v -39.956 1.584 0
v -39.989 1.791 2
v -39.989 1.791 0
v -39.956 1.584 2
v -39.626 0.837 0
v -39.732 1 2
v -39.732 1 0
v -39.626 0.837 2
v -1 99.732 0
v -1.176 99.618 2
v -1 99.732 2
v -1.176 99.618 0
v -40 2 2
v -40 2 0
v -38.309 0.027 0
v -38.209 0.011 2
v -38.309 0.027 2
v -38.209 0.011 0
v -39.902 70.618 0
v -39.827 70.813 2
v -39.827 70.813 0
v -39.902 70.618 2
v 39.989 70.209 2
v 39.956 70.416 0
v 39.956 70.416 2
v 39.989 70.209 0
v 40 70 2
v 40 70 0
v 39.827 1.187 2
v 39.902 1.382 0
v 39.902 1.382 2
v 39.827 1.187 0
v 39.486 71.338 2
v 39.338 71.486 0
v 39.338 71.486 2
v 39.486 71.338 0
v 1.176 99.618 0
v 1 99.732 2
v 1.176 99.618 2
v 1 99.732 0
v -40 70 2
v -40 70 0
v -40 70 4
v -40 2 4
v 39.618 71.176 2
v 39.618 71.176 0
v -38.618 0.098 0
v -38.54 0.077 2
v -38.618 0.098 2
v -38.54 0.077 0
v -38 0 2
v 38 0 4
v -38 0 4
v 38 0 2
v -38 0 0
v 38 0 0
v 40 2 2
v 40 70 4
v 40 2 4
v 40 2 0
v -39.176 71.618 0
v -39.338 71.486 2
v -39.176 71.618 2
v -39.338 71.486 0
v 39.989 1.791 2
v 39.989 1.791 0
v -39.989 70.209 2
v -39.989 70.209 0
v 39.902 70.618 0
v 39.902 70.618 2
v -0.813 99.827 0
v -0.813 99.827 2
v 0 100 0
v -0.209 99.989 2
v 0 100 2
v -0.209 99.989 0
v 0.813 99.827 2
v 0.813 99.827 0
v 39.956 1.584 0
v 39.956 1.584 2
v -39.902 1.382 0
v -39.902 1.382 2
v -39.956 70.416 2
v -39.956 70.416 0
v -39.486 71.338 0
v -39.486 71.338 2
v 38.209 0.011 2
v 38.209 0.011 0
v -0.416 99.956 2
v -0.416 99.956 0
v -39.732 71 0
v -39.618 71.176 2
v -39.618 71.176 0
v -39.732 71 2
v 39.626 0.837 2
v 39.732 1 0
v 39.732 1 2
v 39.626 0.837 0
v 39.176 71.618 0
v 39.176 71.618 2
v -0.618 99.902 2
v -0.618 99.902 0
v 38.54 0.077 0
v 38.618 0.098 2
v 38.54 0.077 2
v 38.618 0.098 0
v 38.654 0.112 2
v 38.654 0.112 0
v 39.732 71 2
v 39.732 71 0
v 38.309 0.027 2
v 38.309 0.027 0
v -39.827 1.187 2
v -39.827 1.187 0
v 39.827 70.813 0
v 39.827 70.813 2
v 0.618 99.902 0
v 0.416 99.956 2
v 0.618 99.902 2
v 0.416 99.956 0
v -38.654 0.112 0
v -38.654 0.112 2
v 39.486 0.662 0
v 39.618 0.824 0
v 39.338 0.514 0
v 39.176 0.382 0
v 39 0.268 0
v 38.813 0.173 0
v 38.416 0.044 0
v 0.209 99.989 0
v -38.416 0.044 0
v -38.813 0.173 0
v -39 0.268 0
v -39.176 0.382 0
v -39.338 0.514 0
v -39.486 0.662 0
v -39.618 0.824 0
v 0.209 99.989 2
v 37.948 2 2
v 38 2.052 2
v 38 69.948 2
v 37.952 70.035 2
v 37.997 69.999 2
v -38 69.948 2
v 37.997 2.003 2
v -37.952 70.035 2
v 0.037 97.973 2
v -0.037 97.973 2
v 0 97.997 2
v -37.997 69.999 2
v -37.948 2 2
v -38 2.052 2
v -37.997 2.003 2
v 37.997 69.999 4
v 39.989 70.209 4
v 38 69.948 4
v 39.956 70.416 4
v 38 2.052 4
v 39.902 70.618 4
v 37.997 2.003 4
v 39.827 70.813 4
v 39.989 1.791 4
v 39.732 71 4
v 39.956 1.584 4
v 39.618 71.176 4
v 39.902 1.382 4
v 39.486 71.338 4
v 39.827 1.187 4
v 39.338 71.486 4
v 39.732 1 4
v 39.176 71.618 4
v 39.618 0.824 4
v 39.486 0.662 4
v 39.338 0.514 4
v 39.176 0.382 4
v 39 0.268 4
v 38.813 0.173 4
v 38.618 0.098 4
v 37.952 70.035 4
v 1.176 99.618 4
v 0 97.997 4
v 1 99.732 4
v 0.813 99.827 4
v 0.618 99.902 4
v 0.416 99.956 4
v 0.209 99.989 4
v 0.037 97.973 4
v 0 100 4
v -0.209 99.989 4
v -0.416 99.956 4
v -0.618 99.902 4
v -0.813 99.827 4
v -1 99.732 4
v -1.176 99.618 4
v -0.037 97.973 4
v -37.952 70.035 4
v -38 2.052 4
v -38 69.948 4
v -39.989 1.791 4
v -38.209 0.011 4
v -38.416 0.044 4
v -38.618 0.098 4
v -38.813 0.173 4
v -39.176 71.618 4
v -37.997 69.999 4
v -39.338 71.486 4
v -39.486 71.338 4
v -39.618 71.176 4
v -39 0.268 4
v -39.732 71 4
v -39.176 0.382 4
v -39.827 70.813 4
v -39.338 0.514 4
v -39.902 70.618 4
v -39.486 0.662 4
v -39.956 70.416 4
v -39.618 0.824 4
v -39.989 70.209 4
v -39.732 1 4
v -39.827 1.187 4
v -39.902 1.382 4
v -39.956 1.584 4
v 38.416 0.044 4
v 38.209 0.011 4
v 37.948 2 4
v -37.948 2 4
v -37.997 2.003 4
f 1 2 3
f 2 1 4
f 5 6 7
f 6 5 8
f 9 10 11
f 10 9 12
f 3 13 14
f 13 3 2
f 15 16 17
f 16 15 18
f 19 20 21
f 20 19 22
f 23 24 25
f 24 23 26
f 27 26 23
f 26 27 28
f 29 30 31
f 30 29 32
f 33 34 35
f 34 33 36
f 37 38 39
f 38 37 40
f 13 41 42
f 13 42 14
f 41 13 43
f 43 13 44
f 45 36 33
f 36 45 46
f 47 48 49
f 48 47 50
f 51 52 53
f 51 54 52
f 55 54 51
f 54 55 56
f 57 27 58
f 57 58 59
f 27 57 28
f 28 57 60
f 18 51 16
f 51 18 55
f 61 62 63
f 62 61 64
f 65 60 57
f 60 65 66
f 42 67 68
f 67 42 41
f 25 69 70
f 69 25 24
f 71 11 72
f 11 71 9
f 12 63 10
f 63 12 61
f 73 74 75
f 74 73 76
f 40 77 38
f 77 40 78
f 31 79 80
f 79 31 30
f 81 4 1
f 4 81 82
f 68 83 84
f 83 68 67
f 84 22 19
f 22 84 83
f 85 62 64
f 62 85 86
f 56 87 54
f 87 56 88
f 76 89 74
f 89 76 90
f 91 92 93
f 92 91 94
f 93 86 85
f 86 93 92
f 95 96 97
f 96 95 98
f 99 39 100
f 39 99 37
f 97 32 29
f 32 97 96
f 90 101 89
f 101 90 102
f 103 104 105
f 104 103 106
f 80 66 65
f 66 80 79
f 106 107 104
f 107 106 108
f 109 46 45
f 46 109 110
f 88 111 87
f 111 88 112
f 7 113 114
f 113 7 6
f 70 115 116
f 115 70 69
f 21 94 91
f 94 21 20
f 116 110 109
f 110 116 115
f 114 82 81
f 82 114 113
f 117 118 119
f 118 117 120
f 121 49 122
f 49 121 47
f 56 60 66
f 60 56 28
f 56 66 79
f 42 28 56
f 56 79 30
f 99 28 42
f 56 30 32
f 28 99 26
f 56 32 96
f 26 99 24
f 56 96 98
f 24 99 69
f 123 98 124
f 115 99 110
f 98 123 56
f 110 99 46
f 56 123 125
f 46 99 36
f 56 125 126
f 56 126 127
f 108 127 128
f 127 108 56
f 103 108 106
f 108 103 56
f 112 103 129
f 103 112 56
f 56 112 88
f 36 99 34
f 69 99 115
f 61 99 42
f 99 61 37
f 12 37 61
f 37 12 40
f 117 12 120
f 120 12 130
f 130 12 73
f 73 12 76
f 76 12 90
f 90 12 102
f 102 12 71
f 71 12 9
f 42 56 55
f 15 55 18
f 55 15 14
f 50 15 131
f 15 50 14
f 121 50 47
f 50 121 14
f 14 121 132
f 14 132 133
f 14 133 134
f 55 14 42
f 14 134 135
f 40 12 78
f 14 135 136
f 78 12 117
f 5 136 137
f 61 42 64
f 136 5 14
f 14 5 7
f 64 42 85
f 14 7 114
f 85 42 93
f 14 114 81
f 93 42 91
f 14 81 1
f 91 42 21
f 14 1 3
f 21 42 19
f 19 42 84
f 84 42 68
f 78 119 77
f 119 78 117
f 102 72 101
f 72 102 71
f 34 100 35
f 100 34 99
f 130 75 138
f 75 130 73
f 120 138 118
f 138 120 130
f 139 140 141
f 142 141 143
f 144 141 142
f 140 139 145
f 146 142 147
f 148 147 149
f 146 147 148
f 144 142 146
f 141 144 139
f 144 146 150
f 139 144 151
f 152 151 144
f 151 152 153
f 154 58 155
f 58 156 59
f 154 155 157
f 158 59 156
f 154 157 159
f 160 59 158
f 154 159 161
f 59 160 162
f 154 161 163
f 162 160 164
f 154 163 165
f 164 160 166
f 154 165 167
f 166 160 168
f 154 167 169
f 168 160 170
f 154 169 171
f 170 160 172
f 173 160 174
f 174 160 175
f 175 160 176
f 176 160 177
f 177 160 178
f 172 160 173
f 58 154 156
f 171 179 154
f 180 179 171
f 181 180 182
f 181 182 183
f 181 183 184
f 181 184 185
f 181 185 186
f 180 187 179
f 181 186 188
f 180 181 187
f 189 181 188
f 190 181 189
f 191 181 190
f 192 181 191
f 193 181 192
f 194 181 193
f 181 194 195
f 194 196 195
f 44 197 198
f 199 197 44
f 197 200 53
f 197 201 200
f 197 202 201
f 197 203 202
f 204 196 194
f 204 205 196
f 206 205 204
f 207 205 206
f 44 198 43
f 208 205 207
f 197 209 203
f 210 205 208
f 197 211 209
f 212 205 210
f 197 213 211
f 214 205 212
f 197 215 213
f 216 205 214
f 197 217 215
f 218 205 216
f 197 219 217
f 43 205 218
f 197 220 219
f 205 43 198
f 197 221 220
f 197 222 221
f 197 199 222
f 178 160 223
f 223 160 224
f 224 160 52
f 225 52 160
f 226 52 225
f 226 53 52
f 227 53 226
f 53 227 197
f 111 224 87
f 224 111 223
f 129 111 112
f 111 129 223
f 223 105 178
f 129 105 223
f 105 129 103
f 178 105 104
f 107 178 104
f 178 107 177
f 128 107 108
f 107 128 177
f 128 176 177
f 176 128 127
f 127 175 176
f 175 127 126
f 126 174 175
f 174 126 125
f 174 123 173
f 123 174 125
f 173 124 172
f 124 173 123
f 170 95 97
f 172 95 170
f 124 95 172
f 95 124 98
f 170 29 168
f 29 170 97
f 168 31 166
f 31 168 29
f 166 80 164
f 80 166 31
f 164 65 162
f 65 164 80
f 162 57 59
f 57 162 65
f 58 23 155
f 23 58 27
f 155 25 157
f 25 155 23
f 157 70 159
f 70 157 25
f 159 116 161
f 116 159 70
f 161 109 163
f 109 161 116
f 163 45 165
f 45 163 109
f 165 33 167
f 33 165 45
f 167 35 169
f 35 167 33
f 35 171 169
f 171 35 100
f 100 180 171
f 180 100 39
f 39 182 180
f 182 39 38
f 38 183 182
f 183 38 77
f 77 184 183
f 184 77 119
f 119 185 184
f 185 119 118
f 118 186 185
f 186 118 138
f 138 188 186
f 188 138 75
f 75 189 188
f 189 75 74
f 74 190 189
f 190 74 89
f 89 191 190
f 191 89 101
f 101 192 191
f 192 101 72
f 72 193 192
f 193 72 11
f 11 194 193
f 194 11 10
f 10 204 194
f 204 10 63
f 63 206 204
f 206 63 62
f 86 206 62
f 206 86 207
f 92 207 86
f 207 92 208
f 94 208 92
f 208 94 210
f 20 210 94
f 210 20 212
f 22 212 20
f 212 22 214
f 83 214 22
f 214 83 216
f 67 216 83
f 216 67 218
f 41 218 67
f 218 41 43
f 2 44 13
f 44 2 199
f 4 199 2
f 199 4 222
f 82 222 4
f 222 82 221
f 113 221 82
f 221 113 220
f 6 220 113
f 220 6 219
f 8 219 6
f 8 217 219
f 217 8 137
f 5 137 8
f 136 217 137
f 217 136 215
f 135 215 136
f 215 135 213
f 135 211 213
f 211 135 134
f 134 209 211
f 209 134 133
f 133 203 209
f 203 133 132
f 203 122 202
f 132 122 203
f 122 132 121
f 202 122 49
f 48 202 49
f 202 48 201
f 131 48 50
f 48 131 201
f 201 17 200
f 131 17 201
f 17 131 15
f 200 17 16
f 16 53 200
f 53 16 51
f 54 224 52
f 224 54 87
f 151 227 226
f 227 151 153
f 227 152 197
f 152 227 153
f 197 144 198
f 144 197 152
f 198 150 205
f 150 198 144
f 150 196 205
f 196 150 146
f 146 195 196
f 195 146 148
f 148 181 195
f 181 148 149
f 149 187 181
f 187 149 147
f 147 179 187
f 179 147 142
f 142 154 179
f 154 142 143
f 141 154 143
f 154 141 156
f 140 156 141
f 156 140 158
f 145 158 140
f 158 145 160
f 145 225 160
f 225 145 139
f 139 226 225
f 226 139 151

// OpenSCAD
// file: shape_lib.scad
// shape_lib.scad
// Library of 2D base shapes for the signboard

$fn = 60; // Smooth curves

module shape_house(width, height, corner_r=2) {
    // House shape: Pentagon logic modification
    // "Pentagon with vertical sides and pointed top"
    // We can construct this by intersecting a square and a triangle or using hull()
    
    body_h = height * 0.7;
    roof_h = height - body_h;
    
    hull() {
        // Bottom corners
        translate([-width/2 + corner_r, corner_r]) circle(r=corner_r);
        translate([width/2 - corner_r, corner_r]) circle(r=corner_r);
        
        // Eaves corners (top of vertical section)
        translate([-width/2 + corner_r, body_h]) circle(r=corner_r);
        translate([width/2 - corner_r, body_h]) circle(r=corner_r);
        
        // Roof peak
        translate([0, height - corner_r]) circle(r=corner_r);
    }
}

module shape_square(width, height, corner_r=5) {
    hull() {
        translate([-width/2 + corner_r, corner_r]) circle(r=corner_r);
        translate([width/2 - corner_r, corner_r]) circle(r=corner_r);
        translate([-width/2 + corner_r, height - corner_r]) circle(r=corner_r);
        translate([width/2 - corner_r, height - corner_r]) circle(r=corner_r);
    }
}

module shape_pentagon(radius, corner_r=2) {
    // Regular pentagon
    hull() {
        for (i = [0:4]) {
            rotate([0, 0, i * 360/5 + 90]) // +90 to point up
            translate([radius - corner_r, 0, 0])
            circle(r=corner_r);
        }
    }
}

module shape_circle(radius) {
    circle(r=radius);
}

// Test render
// translate([-50, 0]) shape_house(40, 50);
// translate([0, 0]) shape_square(40, 40);
// translate([50, 0]) shape_pentagon(20);
// main file
// signboard_core.scad
include <shape_lib.scad>;

// --- Parameters ---
// These will be overridden by the command line or JSON values
SHAPE_TYPE = "HOUSE"; // HOUSE, SQUARE, PENTAGON, CIRCLE
WIDTH = 80;
HEIGHT = 100;
THICKNESS_BASE = 2;
THICKNESS_RIM = 4; // Total height including base
RIM_WIDTH = 2;

// --- Logic ---

module base_plate() {
    linear_extrude(THICKNESS_BASE) {
        if (SHAPE_TYPE == "HOUSE") shape_house(WIDTH, HEIGHT);
        else if (SHAPE_TYPE == "SQUARE") shape_square(WIDTH, HEIGHT);
        else if (SHAPE_TYPE == "PENTAGON") shape_pentagon(WIDTH/2); // Width as diameter approx
        else if (SHAPE_TYPE == "CIRCLE") shape_circle(WIDTH/2);
    }
}

module rim() {
    linear_extrude(THICKNESS_RIM) {
        difference() {
            if (SHAPE_TYPE == "HOUSE") shape_house(WIDTH, HEIGHT);
            else if (SHAPE_TYPE == "SQUARE") shape_square(WIDTH, HEIGHT);
            else if (SHAPE_TYPE == "PENTAGON") shape_pentagon(WIDTH/2);
            else if (SHAPE_TYPE == "CIRCLE") shape_circle(WIDTH/2);
            
            offset(r = -RIM_WIDTH) {
                if (SHAPE_TYPE == "HOUSE") shape_house(WIDTH, HEIGHT);
                else if (SHAPE_TYPE == "SQUARE") shape_square(WIDTH, HEIGHT);
                else if (SHAPE_TYPE == "PENTAGON") shape_pentagon(WIDTH/2);
                else if (SHAPE_TYPE == "CIRCLE") shape_circle(WIDTH/2);
            }
        }
    }
}

// --- Assembly ---
union() {
    color("cyan") base_plate();
    color("white") rim();
}
